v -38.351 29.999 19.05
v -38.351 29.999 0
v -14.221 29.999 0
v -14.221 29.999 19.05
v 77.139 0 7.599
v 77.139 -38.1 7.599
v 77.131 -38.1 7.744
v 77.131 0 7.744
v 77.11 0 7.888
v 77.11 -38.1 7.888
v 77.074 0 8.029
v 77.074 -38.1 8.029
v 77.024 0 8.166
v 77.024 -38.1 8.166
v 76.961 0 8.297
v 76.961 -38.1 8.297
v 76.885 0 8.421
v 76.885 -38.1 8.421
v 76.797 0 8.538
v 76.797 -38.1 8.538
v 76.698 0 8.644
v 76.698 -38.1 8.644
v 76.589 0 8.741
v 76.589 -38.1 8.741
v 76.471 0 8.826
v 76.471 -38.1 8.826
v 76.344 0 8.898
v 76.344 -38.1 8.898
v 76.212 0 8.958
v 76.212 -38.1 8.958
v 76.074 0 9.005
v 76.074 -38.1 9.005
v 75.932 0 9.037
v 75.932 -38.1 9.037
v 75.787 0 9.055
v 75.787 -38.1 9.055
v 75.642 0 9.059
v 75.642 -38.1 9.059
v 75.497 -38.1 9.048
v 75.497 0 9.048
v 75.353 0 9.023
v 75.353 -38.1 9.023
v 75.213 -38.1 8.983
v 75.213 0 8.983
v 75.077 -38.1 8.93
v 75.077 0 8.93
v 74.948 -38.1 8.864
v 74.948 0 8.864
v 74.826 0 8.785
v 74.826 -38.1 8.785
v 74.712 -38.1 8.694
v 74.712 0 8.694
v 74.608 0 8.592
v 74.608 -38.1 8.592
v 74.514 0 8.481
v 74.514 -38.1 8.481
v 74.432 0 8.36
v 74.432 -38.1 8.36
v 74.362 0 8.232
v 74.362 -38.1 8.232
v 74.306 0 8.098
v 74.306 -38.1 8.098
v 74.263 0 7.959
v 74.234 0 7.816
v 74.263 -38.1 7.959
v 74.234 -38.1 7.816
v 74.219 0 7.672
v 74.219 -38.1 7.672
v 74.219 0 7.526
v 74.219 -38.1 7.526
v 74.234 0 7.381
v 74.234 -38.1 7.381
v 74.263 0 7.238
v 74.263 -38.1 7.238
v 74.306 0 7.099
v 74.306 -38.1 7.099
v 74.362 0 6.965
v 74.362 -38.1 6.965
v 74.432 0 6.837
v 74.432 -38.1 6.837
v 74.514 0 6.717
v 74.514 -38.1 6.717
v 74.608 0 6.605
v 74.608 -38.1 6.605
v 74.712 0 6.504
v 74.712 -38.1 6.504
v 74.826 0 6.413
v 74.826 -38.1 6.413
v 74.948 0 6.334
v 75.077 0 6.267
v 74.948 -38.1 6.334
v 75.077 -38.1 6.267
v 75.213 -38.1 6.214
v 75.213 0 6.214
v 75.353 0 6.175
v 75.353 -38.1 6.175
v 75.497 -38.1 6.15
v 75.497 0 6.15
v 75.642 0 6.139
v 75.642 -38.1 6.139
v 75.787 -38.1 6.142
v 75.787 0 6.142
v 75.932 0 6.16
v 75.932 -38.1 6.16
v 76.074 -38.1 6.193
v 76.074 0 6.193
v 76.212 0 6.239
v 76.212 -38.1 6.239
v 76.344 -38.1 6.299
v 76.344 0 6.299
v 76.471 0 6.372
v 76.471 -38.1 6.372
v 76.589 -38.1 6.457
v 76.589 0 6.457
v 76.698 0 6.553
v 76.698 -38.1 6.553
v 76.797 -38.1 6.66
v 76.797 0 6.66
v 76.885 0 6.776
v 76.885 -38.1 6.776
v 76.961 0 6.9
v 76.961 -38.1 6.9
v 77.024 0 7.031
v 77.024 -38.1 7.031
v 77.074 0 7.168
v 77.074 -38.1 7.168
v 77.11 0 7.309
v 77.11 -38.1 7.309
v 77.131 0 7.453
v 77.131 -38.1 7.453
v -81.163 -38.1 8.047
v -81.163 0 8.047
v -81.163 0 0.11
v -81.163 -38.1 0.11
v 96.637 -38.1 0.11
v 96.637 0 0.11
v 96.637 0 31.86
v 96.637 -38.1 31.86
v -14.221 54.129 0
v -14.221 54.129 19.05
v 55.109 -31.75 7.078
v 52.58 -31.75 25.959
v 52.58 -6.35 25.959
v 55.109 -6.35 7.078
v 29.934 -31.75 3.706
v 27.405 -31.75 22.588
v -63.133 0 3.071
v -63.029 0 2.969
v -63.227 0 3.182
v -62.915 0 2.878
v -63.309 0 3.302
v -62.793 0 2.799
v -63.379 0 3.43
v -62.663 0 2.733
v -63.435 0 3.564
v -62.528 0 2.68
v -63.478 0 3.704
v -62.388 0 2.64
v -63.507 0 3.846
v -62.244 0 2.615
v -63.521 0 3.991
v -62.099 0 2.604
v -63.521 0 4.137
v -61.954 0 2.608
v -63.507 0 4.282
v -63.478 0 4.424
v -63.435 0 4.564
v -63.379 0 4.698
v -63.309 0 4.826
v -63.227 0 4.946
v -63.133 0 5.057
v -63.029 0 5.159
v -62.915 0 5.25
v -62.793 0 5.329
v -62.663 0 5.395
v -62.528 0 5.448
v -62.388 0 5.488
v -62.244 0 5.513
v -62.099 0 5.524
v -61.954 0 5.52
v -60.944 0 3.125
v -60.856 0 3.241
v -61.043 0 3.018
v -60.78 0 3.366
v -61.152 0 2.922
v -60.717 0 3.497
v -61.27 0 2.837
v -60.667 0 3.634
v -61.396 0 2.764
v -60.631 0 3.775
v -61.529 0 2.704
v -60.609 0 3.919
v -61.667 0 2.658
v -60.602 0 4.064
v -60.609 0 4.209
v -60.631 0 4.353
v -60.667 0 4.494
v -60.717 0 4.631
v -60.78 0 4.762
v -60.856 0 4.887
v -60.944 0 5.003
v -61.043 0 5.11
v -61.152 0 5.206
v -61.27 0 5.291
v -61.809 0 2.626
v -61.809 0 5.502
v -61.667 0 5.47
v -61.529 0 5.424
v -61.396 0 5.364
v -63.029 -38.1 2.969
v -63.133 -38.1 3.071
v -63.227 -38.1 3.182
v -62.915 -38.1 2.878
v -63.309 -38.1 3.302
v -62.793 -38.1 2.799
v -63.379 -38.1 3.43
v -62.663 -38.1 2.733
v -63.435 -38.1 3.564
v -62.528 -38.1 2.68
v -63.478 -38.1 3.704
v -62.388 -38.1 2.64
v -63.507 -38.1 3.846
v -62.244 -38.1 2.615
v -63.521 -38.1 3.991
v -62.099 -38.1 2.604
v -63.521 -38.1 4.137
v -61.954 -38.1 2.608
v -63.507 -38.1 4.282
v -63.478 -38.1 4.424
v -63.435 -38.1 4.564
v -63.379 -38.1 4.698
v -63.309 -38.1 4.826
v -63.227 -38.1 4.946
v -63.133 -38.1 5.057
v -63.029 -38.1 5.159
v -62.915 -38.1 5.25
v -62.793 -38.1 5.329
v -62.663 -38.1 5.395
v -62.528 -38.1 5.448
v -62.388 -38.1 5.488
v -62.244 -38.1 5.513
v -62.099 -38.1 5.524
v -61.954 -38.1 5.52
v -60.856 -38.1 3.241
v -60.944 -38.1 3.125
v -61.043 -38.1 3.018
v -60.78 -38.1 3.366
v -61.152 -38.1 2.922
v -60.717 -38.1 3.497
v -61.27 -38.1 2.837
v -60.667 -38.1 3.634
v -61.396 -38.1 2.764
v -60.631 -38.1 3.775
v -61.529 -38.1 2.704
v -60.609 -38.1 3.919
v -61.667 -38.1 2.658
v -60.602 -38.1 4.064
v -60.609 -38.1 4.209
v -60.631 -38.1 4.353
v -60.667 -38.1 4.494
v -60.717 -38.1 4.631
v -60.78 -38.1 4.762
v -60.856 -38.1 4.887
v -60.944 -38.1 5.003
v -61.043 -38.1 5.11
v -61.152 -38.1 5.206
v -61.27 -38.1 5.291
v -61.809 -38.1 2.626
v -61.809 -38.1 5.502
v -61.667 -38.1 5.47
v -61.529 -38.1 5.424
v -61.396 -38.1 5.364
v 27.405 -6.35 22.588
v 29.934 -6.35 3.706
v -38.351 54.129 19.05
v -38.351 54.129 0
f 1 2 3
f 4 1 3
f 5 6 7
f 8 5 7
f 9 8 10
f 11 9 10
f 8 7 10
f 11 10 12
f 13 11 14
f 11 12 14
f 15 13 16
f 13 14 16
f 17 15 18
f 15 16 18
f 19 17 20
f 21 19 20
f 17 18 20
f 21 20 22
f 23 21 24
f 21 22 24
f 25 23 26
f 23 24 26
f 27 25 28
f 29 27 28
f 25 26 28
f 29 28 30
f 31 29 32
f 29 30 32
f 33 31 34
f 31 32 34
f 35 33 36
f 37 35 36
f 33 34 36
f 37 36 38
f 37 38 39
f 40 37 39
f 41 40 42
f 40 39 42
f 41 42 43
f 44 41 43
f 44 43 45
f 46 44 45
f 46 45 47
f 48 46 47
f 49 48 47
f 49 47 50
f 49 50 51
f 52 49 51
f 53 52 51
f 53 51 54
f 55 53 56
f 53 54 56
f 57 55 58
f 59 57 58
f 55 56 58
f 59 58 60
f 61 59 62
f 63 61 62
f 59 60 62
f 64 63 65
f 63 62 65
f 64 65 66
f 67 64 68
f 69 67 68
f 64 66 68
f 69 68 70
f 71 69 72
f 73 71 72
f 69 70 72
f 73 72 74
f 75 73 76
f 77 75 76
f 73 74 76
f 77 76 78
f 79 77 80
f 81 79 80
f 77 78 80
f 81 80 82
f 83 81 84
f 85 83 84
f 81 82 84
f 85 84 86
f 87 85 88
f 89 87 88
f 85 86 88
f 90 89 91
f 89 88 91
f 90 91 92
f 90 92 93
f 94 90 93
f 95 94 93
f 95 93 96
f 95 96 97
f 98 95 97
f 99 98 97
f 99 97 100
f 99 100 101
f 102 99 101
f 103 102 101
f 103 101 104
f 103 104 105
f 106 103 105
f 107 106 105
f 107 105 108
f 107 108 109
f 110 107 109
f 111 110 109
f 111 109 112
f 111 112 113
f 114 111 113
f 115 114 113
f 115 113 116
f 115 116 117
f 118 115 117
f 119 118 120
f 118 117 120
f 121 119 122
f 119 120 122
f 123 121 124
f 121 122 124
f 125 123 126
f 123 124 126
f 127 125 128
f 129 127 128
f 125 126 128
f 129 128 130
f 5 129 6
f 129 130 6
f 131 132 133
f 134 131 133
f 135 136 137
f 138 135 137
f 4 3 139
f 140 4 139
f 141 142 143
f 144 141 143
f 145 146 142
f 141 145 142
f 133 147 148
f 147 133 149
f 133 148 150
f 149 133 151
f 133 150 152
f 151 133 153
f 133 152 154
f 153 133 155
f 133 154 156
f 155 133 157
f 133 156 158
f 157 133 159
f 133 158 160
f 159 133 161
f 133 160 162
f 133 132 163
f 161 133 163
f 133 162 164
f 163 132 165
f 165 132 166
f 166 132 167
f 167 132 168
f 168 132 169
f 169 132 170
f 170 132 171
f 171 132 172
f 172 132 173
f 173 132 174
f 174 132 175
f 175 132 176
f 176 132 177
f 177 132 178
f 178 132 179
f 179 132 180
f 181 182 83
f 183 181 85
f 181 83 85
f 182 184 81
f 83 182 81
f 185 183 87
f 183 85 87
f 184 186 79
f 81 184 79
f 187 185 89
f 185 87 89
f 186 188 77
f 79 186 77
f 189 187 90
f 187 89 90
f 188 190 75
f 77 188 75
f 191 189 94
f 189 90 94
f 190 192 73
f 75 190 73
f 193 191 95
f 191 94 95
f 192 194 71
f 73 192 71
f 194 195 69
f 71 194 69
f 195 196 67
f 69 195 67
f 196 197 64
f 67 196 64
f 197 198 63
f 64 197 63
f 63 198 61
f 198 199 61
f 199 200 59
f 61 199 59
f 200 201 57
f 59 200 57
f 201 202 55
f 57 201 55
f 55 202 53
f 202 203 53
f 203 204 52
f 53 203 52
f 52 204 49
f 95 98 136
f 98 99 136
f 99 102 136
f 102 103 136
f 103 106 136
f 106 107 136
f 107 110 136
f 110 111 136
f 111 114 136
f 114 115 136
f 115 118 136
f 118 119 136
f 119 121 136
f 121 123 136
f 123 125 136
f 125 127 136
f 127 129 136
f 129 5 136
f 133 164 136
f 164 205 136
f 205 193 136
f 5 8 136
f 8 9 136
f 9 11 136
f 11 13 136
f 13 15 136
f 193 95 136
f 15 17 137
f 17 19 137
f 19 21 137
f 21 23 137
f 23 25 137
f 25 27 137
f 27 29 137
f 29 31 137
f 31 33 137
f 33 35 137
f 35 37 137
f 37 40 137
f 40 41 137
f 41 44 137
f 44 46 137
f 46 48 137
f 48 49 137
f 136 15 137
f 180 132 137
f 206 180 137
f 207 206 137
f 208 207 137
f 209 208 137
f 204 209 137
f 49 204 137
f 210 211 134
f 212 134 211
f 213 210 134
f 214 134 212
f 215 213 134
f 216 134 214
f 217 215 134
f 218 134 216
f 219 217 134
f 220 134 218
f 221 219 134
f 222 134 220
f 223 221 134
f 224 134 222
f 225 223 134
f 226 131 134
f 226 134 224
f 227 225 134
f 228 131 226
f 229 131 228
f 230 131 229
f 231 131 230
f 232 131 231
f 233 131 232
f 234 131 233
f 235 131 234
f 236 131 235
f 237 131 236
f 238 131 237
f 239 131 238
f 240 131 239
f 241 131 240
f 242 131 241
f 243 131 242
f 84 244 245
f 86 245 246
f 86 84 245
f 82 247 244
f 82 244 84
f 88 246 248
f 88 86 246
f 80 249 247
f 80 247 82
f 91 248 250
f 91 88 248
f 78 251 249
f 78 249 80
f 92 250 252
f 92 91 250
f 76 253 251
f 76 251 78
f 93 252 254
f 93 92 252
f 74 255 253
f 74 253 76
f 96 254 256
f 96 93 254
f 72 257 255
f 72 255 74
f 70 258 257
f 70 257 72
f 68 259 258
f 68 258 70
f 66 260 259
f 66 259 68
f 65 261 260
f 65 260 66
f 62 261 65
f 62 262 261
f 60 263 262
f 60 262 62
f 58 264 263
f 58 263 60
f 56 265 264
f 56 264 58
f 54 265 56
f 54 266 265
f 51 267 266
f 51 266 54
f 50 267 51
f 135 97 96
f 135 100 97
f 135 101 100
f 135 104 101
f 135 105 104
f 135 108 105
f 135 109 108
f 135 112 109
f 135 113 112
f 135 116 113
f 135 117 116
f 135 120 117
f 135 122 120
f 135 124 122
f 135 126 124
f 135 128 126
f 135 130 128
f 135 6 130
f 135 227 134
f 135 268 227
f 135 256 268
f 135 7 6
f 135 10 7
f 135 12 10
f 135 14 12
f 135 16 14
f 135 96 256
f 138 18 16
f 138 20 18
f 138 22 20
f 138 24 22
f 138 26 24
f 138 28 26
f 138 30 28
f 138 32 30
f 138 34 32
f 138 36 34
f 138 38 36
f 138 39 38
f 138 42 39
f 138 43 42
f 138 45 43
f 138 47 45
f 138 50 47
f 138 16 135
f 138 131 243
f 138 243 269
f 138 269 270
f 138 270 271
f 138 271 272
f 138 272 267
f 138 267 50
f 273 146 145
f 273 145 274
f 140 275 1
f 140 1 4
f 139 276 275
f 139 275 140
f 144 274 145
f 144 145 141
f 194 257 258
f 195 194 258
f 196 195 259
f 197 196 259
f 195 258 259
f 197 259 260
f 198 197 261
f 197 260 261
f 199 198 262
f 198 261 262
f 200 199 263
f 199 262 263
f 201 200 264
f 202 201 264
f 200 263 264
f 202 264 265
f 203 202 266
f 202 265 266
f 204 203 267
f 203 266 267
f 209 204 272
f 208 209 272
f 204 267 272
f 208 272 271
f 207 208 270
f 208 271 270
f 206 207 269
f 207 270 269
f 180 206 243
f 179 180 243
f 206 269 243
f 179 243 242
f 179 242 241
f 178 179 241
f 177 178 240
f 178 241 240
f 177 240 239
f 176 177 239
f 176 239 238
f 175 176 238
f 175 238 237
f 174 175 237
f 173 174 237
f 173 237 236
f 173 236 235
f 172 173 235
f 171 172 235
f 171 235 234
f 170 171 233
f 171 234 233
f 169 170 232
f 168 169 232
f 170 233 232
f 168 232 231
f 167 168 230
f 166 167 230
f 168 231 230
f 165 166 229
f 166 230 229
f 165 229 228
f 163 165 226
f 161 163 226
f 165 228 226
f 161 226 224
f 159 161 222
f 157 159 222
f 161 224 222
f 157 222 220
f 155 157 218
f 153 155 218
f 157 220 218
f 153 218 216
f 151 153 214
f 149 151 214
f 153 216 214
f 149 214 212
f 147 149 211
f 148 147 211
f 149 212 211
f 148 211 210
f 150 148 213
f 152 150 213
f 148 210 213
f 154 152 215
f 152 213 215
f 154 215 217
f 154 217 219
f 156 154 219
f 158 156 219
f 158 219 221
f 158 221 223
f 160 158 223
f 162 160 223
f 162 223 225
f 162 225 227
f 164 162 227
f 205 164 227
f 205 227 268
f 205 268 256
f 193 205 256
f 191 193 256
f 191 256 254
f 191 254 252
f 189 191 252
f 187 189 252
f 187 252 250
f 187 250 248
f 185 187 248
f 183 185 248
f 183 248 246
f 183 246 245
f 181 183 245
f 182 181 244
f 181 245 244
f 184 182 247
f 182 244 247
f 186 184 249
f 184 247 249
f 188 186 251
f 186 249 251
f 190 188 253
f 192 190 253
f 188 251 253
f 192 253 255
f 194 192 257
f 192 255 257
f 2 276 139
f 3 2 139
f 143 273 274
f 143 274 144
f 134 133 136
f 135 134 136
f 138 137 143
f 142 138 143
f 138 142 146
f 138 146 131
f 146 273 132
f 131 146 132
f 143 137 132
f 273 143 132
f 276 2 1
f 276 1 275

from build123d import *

# Parameters (mm, degrees)
F1_DEPTH  = 38.1
F2_W      = 25.4
F2_H      = 25.4
F4_DEPTH  = 19.05
F6_R      = 1.4605
F7_DEPTH  = 38.1
F9_R      = 1.4605
F10_DEPTH = 38.1
F12_W     = 24.13
F12_H     = 24.13
F13_DEPTH = 19.05


# Not quite as in the source:
# - a feature of the source that left no trace in its solid (it failed there, or was rolled back) is left out


with BuildPart() as f1:
    # F0 (on Front) → F1 (new body)
    with BuildSketch(Plane.XZ):
        Polygon((96.6367053866, 0.1098374724), (96.6367053866, 31.8598374724), (-81.1632946134, 8.0473374724), (-81.1632946134, 0.1098374724), align=None)
    extrude(amount=F1_DEPTH)

    # F2 (on face) → F4 (cut)
    with BuildSketch(Plane(origin=(-2.4889394817, 0, 18.5840814633), x_dir=(0.9911504425, 0, 0.1327433628), z_dir=(-0.1327433628, 0, 0.9911504425))):
        with Locations((42.8606952689, -19.05)):
            Rectangle(F2_W, F2_H)
    extrude(amount=-F4_DEPTH, mode=Mode.SUBTRACT)

    # F6 (on face) → F7 (cut)
    with BuildSketch(Plane.XZ.offset(38.1)):
        with Locations((-62.0626753688, 4.064)):
            Circle(F6_R)
    extrude(amount=-F7_DEPTH, mode=Mode.SUBTRACT)

    # F9 (on face) → F10 (cut)
    with BuildSketch(Plane.XZ.offset(38.1)):
        with Locations((75.6781622767, 7.5987153687)):
            Circle(F9_R)
    extrude(amount=-F10_DEPTH, mode=Mode.SUBTRACT)


with BuildPart() as f13:
    # F12 (on Top) → F13 (new body)
    with BuildSketch(Plane.XY):
        with Locations((-26.2855645269, 42.0638084072)):
            Rectangle(F12_W, F12_H)
    extrude(amount=F13_DEPTH)


solid = Compound([f1.part, f13.part])
